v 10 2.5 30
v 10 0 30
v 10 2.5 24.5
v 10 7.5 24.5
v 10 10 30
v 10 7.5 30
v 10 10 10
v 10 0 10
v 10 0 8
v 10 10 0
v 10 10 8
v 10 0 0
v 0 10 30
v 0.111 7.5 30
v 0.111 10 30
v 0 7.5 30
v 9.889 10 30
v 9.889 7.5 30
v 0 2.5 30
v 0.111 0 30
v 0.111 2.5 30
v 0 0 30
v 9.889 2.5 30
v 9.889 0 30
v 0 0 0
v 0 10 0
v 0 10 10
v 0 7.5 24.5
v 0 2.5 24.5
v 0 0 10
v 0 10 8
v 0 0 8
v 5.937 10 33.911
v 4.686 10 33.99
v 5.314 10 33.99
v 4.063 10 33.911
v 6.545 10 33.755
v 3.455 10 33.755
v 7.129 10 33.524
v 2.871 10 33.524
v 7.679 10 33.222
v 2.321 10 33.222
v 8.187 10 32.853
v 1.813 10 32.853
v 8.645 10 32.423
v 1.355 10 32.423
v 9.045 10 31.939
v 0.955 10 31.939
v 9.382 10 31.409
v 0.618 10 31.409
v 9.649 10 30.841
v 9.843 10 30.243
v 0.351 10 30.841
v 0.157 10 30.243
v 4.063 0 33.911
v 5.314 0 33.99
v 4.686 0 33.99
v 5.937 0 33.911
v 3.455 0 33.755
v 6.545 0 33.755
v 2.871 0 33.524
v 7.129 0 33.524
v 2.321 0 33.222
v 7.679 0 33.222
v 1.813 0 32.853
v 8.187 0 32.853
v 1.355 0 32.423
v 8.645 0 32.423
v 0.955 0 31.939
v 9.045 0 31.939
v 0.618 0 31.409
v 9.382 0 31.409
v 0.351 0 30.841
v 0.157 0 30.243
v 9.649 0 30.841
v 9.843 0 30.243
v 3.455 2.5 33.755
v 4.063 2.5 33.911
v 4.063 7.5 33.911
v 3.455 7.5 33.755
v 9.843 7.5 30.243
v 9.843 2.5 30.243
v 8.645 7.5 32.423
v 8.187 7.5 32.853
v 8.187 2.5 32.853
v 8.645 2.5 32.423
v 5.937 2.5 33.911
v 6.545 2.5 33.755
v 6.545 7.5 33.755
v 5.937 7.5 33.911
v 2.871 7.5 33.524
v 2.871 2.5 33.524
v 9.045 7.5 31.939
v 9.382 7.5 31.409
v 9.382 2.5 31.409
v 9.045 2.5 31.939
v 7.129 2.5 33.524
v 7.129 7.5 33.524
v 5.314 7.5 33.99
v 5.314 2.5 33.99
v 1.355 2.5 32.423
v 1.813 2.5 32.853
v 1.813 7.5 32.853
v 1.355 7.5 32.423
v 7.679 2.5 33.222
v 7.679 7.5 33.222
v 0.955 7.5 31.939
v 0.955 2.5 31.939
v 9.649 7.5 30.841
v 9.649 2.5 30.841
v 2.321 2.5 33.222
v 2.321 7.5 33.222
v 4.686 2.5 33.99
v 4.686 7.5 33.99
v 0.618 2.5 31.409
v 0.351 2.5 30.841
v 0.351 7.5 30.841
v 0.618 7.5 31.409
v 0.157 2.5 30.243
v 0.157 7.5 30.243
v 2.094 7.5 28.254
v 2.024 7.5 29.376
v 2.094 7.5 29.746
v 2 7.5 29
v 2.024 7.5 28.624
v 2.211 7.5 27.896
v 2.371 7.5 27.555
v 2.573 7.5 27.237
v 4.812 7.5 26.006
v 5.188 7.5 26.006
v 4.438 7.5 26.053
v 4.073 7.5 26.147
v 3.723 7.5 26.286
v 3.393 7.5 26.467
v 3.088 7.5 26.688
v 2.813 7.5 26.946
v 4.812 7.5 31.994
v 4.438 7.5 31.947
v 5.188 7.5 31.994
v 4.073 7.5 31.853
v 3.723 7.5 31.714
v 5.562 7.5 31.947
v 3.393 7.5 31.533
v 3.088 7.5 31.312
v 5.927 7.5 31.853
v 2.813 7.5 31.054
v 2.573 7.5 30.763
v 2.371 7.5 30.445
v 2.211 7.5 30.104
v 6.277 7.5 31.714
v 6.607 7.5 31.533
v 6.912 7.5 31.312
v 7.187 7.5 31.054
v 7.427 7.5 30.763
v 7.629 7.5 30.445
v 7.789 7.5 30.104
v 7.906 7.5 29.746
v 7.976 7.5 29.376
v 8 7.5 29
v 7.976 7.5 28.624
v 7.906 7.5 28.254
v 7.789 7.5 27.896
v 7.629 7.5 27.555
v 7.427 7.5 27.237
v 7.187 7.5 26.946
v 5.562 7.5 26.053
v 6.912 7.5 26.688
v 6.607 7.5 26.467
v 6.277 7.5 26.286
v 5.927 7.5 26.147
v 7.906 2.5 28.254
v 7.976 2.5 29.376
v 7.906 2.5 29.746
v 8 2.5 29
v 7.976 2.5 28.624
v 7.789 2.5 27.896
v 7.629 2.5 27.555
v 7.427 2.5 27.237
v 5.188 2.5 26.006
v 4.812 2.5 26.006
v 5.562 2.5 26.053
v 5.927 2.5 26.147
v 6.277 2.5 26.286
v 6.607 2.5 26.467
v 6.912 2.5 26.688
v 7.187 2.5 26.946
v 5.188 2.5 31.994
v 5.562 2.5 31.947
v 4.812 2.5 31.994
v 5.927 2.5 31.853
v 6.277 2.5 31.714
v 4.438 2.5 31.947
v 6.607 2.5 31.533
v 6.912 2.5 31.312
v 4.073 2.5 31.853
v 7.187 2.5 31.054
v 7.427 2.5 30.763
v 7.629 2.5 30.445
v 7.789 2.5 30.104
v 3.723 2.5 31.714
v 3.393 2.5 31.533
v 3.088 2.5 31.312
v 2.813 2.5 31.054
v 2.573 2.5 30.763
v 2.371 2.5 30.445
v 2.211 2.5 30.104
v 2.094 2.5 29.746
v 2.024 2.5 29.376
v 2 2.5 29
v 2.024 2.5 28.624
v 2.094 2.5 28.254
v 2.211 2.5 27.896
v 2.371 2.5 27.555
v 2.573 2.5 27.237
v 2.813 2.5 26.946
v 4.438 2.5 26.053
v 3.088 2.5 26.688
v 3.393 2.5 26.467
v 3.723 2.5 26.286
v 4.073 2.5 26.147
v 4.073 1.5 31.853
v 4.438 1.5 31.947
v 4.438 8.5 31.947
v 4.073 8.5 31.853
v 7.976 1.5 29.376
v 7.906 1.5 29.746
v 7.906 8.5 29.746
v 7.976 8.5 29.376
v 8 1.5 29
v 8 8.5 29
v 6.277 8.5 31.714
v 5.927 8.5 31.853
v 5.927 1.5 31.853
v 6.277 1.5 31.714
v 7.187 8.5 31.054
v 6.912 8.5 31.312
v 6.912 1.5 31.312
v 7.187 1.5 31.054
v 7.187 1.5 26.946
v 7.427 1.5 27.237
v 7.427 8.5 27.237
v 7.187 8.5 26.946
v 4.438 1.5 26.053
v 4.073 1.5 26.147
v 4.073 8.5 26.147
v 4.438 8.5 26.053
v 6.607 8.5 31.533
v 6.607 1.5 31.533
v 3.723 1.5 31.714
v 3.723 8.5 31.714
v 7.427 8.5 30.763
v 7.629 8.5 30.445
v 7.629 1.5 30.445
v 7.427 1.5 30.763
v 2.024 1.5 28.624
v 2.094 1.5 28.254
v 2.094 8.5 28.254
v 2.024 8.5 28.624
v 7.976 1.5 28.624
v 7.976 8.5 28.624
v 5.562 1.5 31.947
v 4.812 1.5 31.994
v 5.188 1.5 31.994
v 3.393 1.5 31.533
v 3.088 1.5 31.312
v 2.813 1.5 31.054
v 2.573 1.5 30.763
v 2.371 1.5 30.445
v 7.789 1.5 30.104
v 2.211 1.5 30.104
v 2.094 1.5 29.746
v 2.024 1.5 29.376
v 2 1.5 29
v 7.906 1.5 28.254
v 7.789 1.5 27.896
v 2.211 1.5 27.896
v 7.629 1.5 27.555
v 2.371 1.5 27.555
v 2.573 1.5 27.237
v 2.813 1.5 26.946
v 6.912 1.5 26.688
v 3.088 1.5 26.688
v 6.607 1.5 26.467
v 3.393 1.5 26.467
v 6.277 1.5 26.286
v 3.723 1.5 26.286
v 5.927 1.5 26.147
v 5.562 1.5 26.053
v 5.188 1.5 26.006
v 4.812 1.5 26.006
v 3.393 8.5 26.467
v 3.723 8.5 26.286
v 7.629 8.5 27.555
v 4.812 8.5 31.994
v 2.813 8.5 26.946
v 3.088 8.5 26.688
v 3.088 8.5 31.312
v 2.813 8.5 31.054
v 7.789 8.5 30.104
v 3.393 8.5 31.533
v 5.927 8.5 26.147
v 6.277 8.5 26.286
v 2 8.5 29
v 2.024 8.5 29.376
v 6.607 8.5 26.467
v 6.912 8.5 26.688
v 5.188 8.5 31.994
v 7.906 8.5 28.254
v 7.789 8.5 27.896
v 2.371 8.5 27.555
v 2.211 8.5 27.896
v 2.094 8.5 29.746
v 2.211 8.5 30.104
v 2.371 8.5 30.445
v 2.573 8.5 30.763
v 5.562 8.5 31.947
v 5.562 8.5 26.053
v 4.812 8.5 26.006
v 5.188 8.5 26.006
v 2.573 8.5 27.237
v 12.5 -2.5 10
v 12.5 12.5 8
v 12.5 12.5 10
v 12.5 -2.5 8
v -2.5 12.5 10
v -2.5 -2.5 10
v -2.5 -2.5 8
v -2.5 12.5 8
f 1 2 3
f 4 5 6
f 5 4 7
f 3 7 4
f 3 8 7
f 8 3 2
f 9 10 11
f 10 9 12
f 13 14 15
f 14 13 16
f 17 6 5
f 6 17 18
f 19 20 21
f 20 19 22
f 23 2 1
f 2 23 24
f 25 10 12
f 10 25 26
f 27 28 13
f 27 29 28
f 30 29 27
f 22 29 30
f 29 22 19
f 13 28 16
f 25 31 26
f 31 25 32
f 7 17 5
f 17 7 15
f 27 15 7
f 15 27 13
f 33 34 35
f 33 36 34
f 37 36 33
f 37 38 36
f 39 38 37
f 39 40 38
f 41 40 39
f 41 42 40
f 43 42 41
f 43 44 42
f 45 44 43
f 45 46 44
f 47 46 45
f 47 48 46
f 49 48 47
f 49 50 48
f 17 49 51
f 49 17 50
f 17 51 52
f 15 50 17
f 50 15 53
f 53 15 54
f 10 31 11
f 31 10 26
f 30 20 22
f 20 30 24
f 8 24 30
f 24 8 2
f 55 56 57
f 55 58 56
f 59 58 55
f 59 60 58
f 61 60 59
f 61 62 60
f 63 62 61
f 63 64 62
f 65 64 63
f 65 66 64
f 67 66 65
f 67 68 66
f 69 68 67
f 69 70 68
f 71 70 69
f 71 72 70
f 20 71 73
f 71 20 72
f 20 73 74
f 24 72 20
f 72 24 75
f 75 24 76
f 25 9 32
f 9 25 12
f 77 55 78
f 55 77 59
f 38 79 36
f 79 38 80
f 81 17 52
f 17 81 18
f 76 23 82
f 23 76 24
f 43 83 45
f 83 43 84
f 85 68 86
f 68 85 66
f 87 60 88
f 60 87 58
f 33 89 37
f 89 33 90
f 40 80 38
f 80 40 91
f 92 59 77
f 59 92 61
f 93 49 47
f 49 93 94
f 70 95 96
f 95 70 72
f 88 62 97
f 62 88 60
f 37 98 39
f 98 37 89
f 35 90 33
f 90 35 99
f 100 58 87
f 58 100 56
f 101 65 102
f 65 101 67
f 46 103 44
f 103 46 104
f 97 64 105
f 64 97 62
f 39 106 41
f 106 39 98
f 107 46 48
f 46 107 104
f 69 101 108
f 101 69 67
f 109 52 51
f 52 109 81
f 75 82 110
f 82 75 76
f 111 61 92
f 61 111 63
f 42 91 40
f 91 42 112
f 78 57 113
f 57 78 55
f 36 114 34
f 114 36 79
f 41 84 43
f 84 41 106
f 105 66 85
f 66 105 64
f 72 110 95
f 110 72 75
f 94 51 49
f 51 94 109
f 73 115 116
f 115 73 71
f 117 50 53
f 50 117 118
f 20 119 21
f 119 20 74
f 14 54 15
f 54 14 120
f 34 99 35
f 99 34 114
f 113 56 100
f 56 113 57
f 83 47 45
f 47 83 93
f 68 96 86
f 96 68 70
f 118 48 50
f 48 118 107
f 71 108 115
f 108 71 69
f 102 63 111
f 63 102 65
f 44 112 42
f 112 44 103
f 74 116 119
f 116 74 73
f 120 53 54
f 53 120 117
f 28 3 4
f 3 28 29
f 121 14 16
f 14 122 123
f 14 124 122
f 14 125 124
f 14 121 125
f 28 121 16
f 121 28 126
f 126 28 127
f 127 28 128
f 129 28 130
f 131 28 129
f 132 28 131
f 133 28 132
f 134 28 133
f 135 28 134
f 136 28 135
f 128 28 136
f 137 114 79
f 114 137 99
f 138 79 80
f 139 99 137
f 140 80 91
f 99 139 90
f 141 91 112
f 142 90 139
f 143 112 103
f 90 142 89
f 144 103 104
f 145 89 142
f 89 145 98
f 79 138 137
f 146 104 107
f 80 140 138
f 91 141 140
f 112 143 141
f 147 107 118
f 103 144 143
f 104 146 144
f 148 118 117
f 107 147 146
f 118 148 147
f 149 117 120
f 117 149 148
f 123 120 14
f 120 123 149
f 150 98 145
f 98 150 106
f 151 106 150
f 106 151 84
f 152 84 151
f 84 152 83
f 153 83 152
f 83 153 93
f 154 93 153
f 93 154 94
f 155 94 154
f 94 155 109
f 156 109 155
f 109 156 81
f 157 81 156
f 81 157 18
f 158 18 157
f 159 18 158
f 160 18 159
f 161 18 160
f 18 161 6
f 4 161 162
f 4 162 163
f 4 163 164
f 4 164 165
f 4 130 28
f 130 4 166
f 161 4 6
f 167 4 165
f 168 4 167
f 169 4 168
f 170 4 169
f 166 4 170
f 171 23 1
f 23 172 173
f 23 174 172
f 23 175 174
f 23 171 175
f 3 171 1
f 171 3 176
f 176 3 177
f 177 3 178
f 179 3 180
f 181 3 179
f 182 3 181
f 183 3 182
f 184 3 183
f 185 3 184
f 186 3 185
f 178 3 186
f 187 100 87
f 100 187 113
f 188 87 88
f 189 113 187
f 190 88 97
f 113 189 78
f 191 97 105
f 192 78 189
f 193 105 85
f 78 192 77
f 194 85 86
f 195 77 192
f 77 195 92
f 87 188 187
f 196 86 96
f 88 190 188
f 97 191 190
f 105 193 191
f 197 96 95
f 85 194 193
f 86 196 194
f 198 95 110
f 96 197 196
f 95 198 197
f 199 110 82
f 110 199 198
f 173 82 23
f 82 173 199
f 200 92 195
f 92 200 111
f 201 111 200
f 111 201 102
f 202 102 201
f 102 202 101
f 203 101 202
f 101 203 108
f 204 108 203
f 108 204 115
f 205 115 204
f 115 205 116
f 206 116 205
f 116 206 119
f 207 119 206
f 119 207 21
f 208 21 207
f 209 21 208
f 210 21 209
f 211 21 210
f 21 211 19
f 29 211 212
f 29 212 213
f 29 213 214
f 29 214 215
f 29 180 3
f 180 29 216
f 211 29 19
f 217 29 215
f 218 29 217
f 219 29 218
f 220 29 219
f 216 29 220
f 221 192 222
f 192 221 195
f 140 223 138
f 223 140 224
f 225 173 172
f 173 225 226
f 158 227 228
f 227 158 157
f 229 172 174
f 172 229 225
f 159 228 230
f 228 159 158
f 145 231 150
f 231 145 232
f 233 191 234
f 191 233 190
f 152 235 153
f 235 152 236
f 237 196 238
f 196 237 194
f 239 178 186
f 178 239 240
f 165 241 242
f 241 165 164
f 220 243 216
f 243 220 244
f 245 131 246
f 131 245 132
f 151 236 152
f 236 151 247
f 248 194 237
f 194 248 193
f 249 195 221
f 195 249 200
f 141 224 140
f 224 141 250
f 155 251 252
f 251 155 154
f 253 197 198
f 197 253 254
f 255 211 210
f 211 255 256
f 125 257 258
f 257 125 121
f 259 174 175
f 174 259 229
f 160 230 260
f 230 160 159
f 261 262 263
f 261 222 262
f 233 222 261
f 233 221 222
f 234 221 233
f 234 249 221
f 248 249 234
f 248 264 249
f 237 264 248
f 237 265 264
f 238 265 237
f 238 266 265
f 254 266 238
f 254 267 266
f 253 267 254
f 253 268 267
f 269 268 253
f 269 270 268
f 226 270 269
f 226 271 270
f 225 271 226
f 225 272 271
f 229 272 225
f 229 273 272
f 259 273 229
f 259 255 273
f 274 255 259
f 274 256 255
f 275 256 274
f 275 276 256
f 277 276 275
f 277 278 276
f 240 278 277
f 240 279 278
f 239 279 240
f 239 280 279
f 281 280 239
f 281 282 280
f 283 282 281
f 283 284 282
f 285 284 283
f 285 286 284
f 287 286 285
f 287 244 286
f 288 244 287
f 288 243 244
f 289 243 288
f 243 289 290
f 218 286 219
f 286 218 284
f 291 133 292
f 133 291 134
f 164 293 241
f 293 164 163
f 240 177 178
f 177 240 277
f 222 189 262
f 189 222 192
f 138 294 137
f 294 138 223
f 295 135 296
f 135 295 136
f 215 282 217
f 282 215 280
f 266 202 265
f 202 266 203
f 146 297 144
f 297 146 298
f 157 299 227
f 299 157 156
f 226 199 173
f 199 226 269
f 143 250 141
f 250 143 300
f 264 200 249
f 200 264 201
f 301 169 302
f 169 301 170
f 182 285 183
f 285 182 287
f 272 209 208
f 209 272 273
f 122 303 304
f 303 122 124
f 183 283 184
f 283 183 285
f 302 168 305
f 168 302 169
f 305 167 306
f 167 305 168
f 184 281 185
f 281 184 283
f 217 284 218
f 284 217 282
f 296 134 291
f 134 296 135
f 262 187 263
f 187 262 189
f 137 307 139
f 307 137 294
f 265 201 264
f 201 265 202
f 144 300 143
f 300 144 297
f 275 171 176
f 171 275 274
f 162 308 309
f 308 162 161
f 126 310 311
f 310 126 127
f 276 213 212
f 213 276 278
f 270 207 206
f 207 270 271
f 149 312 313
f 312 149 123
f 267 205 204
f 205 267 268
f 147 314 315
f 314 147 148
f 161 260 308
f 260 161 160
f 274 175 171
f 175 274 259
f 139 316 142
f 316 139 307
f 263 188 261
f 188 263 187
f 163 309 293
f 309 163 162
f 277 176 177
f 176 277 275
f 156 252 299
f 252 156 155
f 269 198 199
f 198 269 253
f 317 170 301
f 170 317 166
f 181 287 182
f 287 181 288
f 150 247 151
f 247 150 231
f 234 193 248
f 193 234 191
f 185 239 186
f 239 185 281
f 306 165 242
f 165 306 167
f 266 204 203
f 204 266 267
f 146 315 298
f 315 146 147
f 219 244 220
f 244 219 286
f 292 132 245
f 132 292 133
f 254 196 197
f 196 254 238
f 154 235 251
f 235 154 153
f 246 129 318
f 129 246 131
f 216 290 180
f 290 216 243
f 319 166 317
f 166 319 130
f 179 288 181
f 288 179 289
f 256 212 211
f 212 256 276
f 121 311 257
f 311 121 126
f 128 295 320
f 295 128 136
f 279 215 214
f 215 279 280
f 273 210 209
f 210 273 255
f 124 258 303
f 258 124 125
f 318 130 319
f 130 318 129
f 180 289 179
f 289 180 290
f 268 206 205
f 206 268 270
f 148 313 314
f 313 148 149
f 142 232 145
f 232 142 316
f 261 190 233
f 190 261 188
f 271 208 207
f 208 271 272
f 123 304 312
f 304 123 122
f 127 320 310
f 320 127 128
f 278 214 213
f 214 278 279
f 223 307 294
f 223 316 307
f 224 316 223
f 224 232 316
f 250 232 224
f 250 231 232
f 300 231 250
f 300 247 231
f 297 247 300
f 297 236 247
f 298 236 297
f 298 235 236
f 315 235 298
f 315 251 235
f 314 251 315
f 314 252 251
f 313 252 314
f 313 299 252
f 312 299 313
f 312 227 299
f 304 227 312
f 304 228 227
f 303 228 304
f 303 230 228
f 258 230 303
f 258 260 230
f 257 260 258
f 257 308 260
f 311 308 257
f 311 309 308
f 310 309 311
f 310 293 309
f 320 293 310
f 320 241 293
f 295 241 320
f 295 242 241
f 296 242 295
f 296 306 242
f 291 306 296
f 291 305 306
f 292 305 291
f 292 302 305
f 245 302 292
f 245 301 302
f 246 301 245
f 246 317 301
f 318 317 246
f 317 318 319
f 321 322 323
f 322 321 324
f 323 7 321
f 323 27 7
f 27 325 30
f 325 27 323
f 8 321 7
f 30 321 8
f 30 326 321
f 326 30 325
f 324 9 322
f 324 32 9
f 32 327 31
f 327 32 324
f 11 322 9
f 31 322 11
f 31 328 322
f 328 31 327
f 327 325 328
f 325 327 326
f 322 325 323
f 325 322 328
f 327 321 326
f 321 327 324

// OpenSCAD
//componente singolo danneggiato.
difference(){
difference(){
union(){
cube([10,10,30]);//corpo centrale
translate([5,10,29])rotate([90,0,0])cylinder(10,5,5,$fn=50);//arco
}
translate([-1,2.5,24.5]) cube([12,5,10]);//parallelepipedo sottratto dal cilidro, per formare i due pezzi separati
}
translate([5,8.5,29])rotate([90,0,0])cylinder(7,3,3,$fn=50);//cerchi dentro l'arco
}
translate([-2.5,-2.5,8])cube([15,15,2]);//parallelepipedo posizionato a circa la metà
